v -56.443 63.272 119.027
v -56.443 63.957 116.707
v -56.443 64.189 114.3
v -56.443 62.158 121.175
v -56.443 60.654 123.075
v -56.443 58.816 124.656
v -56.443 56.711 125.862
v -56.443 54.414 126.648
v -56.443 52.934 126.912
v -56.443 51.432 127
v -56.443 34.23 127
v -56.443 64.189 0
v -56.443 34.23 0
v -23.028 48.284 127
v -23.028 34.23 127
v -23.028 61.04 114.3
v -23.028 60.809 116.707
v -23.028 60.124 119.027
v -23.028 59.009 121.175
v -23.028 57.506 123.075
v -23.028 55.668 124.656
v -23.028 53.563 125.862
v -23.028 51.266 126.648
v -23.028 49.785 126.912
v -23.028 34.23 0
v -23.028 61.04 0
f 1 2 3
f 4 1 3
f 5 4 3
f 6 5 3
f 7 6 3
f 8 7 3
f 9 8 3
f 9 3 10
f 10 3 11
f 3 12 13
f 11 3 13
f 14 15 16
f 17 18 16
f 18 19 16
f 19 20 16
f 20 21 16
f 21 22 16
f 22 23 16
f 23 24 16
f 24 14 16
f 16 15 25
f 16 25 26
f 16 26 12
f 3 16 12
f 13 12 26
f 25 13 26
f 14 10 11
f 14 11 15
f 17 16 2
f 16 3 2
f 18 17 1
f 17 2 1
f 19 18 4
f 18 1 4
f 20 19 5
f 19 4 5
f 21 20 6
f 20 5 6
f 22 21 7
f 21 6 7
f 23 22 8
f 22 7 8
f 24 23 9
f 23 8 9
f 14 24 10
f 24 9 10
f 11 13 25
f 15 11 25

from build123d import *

# Parameters (mm, degrees)
F1_DEPTH = 127
F2_R     = 12.7


with BuildPart() as f1:
    # F0 (on Top) → F1 (new body)
    with BuildSketch(Plane.XY):
        Polygon((-23.028424, 34.230471), (-23.028424, 61.040085), (-56.443118, 64.188562), (-56.443118, 34.230471), align=None)
    extrude(amount=F1_DEPTH)

    # F2
    f2_edges = [f1.edges().sort_by_distance(p)[0] for p in [
        (-39.735771, 62.614324, 127),
    ]]
    fillet(f2_edges, radius=F2_R)


solid = f1.part
